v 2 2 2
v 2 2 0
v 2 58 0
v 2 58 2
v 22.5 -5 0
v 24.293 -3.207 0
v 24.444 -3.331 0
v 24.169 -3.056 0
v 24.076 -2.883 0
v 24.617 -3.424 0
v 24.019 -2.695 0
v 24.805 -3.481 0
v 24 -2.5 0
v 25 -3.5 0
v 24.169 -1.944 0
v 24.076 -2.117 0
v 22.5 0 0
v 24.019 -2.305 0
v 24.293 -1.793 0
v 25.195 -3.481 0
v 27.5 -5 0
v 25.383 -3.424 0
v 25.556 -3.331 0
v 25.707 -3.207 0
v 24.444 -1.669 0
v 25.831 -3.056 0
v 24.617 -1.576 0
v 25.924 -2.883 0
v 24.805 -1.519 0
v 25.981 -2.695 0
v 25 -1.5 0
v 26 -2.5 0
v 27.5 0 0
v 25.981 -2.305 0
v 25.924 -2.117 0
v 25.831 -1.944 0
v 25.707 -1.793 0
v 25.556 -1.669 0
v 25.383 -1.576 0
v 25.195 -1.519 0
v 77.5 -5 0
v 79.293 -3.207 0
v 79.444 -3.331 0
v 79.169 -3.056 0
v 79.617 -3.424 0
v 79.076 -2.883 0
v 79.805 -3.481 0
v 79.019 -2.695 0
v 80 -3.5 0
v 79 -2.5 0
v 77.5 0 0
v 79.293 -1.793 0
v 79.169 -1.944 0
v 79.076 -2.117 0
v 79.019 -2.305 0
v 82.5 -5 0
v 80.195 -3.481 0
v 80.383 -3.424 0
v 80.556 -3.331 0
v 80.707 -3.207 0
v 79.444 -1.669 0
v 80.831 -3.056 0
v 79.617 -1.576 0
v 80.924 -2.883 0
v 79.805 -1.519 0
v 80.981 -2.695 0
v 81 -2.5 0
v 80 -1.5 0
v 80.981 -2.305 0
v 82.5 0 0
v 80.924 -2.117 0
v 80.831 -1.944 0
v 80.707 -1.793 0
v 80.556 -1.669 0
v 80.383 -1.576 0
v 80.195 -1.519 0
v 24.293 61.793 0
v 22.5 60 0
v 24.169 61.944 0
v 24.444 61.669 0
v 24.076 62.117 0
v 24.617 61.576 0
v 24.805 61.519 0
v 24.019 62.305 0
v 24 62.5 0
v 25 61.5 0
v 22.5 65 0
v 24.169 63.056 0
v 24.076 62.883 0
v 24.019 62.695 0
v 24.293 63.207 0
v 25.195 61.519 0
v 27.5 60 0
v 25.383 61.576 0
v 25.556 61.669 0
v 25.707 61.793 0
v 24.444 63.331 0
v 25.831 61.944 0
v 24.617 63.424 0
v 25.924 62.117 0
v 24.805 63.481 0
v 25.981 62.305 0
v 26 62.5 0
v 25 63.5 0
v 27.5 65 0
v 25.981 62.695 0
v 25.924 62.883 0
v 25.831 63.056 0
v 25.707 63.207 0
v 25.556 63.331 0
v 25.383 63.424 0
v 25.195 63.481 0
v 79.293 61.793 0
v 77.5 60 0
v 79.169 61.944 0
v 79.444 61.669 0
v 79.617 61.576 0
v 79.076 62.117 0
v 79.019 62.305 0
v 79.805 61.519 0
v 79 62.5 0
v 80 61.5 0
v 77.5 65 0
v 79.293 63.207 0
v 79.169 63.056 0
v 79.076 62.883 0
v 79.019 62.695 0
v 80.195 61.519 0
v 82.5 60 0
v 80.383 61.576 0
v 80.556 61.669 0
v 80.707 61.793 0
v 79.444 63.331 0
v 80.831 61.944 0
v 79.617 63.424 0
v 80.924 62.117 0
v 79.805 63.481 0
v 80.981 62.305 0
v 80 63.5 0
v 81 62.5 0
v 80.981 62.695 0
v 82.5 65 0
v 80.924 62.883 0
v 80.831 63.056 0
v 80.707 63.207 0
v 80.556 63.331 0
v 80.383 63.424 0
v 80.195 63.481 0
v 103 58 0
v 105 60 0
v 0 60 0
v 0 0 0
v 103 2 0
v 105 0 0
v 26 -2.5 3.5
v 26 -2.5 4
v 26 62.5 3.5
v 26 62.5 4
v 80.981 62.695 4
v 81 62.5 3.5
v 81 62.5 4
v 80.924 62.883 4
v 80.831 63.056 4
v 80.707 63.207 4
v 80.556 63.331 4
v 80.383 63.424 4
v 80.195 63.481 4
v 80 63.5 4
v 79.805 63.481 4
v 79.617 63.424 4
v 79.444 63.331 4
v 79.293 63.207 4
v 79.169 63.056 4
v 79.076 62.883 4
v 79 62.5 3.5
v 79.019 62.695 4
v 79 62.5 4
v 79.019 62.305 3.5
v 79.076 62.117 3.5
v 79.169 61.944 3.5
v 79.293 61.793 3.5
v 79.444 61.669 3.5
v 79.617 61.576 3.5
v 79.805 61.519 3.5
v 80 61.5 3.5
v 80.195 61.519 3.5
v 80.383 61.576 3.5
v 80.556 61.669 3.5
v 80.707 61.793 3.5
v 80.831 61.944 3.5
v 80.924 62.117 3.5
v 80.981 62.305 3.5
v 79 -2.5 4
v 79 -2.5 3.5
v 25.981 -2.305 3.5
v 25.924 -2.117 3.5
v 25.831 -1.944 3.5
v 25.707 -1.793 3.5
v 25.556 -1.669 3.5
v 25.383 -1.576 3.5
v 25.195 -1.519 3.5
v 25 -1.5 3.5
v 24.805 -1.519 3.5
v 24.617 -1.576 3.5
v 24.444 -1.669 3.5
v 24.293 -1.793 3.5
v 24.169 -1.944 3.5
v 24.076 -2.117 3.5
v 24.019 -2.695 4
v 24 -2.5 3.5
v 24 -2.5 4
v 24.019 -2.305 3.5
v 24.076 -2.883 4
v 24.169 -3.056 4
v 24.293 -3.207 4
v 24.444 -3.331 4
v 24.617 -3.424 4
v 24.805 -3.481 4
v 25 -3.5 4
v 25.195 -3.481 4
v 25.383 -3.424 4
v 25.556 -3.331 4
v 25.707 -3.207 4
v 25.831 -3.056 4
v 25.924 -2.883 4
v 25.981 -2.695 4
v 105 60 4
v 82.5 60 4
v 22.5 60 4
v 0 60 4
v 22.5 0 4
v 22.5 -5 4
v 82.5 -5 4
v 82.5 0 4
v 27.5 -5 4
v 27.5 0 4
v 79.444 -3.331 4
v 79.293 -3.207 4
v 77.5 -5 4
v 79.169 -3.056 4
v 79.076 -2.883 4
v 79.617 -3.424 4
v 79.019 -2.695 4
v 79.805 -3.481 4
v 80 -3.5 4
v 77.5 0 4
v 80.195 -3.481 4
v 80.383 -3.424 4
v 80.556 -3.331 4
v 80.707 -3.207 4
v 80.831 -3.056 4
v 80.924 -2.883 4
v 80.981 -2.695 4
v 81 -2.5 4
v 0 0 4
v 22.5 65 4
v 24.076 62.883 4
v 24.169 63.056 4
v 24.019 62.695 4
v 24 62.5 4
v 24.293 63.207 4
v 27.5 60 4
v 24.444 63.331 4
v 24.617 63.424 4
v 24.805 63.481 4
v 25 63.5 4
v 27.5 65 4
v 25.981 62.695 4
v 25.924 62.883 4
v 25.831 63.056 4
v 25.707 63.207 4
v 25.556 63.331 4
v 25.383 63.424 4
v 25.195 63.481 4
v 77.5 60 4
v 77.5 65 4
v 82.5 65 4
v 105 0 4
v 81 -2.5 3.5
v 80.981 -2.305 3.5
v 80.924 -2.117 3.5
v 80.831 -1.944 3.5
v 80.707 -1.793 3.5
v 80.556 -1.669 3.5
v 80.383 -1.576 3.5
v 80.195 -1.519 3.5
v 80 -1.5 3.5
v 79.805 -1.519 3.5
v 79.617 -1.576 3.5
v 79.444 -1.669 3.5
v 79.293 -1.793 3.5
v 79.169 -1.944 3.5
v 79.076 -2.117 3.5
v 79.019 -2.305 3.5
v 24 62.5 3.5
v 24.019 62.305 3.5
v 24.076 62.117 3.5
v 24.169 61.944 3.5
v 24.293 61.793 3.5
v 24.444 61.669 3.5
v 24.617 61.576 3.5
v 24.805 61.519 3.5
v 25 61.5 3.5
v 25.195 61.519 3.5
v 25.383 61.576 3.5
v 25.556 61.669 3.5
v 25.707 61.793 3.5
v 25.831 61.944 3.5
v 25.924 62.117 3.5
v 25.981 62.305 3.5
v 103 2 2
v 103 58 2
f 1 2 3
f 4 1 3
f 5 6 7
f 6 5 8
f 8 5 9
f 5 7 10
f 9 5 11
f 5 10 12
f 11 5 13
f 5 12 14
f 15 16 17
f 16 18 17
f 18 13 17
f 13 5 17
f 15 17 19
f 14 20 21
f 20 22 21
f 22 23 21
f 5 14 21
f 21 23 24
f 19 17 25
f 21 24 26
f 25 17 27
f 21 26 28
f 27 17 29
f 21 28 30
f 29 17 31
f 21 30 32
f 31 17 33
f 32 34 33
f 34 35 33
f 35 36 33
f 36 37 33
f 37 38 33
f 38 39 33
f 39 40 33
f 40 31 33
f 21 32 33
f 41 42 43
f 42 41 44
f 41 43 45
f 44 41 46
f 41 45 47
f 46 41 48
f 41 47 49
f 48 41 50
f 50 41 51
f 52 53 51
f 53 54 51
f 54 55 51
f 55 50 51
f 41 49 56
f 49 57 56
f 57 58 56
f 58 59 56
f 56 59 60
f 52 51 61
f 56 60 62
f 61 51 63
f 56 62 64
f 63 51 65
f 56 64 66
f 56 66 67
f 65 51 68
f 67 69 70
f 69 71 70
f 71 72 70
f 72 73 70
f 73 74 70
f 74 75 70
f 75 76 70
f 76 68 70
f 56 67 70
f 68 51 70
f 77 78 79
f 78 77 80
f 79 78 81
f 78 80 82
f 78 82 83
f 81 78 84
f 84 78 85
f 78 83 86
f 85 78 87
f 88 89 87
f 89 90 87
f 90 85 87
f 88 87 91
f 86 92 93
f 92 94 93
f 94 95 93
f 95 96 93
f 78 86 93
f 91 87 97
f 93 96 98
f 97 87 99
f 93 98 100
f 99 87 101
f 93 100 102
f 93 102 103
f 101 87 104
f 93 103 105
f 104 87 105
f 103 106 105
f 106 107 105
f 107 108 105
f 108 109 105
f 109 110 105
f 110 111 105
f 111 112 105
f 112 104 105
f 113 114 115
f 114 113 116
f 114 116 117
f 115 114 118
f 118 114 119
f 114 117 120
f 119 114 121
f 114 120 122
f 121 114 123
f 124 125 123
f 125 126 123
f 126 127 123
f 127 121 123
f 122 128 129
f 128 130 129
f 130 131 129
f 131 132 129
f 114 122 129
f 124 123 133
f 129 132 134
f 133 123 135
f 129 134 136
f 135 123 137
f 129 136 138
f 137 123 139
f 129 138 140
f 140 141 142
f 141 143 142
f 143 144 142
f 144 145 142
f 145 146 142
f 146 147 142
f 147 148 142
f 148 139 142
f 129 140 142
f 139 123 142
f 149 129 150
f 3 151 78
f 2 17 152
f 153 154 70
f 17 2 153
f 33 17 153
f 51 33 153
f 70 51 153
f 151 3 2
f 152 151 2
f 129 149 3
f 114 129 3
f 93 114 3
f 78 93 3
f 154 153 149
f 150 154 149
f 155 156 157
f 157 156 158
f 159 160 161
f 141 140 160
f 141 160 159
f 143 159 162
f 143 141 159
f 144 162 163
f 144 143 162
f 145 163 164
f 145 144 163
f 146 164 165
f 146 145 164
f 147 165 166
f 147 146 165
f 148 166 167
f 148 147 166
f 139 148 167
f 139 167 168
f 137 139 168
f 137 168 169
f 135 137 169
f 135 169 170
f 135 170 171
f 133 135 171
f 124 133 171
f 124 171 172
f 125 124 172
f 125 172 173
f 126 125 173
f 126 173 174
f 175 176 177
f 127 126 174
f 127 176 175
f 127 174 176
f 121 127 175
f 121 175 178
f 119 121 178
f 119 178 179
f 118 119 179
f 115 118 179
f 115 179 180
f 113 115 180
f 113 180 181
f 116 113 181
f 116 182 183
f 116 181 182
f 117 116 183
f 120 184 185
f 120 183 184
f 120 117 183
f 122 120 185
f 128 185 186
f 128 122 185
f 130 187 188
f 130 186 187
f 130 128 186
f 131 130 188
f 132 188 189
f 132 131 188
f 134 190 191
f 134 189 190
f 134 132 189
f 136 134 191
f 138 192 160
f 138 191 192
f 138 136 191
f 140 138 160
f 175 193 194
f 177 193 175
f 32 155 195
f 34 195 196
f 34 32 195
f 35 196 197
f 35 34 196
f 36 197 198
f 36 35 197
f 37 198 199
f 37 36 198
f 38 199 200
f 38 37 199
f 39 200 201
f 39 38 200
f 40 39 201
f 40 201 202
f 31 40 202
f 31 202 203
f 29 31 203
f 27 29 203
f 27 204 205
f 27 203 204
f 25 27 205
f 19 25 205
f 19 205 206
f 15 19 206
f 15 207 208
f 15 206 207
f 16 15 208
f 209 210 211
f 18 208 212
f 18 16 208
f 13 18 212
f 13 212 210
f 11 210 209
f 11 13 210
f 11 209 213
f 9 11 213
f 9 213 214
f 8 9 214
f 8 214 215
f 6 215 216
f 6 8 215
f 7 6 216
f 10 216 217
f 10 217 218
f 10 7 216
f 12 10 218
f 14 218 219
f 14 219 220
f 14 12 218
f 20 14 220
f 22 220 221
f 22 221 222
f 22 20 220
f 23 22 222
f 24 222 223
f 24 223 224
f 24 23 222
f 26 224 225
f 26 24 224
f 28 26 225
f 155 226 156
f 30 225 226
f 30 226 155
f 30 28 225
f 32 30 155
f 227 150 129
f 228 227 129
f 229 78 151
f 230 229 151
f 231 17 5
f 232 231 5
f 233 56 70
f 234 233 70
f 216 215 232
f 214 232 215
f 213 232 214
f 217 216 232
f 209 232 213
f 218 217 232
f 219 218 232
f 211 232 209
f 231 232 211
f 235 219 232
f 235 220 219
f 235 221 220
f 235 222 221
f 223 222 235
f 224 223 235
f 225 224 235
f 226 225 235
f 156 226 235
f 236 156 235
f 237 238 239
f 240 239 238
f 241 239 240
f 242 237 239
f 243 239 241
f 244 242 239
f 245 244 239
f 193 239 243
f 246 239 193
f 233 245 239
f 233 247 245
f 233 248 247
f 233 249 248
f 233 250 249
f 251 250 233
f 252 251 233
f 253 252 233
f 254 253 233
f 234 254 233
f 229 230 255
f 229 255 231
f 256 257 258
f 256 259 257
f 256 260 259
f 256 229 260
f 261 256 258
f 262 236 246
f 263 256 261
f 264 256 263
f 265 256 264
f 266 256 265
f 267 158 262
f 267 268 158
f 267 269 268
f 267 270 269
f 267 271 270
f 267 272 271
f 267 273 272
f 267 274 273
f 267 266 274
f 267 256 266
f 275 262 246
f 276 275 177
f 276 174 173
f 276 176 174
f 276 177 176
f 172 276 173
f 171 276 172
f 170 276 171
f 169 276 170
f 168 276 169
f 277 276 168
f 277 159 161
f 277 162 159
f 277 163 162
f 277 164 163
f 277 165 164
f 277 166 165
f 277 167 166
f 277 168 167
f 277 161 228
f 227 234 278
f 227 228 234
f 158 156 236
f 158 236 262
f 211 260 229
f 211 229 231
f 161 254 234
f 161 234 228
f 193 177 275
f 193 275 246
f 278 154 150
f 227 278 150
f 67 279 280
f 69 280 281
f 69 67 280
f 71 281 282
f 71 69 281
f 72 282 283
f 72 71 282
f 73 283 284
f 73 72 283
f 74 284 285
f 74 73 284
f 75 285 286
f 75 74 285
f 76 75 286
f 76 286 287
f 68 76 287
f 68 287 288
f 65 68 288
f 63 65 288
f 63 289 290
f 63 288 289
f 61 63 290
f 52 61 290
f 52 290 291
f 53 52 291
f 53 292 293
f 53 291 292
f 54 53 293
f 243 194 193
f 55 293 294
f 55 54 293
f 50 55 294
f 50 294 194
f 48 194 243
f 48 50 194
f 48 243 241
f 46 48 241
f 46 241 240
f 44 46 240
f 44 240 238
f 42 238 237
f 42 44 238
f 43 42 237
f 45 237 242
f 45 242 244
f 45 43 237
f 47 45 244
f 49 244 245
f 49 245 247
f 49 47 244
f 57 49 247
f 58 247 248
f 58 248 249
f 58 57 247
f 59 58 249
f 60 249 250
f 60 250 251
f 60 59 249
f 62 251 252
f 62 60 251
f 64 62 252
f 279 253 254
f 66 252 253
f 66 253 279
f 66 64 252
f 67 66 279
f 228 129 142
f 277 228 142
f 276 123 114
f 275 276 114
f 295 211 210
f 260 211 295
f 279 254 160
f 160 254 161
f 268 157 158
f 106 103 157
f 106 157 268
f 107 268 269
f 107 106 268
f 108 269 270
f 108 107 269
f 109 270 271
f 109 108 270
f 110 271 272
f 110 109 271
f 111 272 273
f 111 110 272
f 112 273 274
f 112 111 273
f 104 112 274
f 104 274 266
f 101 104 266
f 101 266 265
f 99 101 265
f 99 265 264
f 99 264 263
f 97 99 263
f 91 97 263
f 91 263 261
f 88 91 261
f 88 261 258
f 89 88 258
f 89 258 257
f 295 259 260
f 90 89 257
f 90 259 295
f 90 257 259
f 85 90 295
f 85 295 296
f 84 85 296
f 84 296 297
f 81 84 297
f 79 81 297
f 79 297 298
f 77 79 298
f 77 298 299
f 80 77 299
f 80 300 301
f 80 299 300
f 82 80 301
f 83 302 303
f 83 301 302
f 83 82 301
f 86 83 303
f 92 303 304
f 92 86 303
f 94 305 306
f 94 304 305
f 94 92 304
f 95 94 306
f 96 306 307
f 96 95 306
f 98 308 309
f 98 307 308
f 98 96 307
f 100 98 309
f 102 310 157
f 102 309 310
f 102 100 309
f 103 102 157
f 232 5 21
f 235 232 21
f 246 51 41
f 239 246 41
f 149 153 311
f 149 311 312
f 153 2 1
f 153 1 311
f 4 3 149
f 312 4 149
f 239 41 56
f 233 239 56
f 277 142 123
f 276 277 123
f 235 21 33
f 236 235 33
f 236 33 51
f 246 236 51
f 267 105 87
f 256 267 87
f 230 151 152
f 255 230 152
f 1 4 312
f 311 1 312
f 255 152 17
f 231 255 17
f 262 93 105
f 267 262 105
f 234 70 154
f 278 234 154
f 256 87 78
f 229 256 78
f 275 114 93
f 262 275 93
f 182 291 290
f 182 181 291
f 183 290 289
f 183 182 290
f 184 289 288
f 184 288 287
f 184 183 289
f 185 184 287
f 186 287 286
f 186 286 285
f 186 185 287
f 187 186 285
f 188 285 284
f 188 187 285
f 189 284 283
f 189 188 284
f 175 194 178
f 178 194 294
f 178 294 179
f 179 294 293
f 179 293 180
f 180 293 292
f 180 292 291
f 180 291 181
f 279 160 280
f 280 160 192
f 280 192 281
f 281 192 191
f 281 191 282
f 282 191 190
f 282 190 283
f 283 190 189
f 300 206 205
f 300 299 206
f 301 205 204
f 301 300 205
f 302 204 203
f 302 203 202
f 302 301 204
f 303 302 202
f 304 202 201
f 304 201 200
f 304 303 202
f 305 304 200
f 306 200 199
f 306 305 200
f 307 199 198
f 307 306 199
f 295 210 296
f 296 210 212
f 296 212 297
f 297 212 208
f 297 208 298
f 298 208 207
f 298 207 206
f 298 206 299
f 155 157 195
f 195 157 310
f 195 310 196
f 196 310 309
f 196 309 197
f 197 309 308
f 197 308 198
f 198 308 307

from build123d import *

# Parameters (mm, degrees)
SKETCH_R        = 1
PAD_DEPTH       = 4
SKETCH001_W     = 101
SKETCH001_H     = 56
POCKET_DEPTH    = 2
SKETCH002_W     = 2
SKETCH002_H     = 65
POCKET001_DEPTH = 0.5


with BuildPart() as part:
    # Sketch → Pad (new body)
    with BuildSketch(Plane.XY):
        Polygon((105, 0), (105, 60), (82.5, 60), (82.5, 65), (77.5, 65), (77.5, 60), (27.5, 60), (27.5, 65), (22.5, 65), (22.5, 60), (0, 60), (0, 0), (22.5, 0), (22.5, -5), (27.5, -5), (27.5, 0), (77.5, 0), (77.5, -5), (82.5, -5), (82.5, 0), align=None)
        with Locations((25, 62.5)):
            Circle(SKETCH_R, mode=Mode.SUBTRACT)
        with Locations((80, 62.5)):
            Circle(SKETCH_R, mode=Mode.SUBTRACT)
        with Locations((80, -2.5)):
            Circle(SKETCH_R, mode=Mode.SUBTRACT)
        with Locations((25, -2.5)):
            Circle(SKETCH_R, mode=Mode.SUBTRACT)
    extrude(amount=PAD_DEPTH)

    # Sketch001 → Pocket (cut)
    with BuildSketch(Plane.XY):
        with Locations((52.5, 30)):
            Rectangle(SKETCH001_W, SKETCH001_H)
    extrude(amount=POCKET_DEPTH, mode=Mode.SUBTRACT)

    # Sketch002 (on Face5 of Pocket) → Pocket001 (cut)
    with BuildSketch(Plane.XY.offset(4)):
        with Locations((25, 30)):
            Rectangle(SKETCH002_W, SKETCH002_H)
        with Locations((80, 30)):
            Rectangle(SKETCH002_W, SKETCH002_H)
    extrude(amount=-POCKET001_DEPTH, mode=Mode.SUBTRACT)


solid = part.part
